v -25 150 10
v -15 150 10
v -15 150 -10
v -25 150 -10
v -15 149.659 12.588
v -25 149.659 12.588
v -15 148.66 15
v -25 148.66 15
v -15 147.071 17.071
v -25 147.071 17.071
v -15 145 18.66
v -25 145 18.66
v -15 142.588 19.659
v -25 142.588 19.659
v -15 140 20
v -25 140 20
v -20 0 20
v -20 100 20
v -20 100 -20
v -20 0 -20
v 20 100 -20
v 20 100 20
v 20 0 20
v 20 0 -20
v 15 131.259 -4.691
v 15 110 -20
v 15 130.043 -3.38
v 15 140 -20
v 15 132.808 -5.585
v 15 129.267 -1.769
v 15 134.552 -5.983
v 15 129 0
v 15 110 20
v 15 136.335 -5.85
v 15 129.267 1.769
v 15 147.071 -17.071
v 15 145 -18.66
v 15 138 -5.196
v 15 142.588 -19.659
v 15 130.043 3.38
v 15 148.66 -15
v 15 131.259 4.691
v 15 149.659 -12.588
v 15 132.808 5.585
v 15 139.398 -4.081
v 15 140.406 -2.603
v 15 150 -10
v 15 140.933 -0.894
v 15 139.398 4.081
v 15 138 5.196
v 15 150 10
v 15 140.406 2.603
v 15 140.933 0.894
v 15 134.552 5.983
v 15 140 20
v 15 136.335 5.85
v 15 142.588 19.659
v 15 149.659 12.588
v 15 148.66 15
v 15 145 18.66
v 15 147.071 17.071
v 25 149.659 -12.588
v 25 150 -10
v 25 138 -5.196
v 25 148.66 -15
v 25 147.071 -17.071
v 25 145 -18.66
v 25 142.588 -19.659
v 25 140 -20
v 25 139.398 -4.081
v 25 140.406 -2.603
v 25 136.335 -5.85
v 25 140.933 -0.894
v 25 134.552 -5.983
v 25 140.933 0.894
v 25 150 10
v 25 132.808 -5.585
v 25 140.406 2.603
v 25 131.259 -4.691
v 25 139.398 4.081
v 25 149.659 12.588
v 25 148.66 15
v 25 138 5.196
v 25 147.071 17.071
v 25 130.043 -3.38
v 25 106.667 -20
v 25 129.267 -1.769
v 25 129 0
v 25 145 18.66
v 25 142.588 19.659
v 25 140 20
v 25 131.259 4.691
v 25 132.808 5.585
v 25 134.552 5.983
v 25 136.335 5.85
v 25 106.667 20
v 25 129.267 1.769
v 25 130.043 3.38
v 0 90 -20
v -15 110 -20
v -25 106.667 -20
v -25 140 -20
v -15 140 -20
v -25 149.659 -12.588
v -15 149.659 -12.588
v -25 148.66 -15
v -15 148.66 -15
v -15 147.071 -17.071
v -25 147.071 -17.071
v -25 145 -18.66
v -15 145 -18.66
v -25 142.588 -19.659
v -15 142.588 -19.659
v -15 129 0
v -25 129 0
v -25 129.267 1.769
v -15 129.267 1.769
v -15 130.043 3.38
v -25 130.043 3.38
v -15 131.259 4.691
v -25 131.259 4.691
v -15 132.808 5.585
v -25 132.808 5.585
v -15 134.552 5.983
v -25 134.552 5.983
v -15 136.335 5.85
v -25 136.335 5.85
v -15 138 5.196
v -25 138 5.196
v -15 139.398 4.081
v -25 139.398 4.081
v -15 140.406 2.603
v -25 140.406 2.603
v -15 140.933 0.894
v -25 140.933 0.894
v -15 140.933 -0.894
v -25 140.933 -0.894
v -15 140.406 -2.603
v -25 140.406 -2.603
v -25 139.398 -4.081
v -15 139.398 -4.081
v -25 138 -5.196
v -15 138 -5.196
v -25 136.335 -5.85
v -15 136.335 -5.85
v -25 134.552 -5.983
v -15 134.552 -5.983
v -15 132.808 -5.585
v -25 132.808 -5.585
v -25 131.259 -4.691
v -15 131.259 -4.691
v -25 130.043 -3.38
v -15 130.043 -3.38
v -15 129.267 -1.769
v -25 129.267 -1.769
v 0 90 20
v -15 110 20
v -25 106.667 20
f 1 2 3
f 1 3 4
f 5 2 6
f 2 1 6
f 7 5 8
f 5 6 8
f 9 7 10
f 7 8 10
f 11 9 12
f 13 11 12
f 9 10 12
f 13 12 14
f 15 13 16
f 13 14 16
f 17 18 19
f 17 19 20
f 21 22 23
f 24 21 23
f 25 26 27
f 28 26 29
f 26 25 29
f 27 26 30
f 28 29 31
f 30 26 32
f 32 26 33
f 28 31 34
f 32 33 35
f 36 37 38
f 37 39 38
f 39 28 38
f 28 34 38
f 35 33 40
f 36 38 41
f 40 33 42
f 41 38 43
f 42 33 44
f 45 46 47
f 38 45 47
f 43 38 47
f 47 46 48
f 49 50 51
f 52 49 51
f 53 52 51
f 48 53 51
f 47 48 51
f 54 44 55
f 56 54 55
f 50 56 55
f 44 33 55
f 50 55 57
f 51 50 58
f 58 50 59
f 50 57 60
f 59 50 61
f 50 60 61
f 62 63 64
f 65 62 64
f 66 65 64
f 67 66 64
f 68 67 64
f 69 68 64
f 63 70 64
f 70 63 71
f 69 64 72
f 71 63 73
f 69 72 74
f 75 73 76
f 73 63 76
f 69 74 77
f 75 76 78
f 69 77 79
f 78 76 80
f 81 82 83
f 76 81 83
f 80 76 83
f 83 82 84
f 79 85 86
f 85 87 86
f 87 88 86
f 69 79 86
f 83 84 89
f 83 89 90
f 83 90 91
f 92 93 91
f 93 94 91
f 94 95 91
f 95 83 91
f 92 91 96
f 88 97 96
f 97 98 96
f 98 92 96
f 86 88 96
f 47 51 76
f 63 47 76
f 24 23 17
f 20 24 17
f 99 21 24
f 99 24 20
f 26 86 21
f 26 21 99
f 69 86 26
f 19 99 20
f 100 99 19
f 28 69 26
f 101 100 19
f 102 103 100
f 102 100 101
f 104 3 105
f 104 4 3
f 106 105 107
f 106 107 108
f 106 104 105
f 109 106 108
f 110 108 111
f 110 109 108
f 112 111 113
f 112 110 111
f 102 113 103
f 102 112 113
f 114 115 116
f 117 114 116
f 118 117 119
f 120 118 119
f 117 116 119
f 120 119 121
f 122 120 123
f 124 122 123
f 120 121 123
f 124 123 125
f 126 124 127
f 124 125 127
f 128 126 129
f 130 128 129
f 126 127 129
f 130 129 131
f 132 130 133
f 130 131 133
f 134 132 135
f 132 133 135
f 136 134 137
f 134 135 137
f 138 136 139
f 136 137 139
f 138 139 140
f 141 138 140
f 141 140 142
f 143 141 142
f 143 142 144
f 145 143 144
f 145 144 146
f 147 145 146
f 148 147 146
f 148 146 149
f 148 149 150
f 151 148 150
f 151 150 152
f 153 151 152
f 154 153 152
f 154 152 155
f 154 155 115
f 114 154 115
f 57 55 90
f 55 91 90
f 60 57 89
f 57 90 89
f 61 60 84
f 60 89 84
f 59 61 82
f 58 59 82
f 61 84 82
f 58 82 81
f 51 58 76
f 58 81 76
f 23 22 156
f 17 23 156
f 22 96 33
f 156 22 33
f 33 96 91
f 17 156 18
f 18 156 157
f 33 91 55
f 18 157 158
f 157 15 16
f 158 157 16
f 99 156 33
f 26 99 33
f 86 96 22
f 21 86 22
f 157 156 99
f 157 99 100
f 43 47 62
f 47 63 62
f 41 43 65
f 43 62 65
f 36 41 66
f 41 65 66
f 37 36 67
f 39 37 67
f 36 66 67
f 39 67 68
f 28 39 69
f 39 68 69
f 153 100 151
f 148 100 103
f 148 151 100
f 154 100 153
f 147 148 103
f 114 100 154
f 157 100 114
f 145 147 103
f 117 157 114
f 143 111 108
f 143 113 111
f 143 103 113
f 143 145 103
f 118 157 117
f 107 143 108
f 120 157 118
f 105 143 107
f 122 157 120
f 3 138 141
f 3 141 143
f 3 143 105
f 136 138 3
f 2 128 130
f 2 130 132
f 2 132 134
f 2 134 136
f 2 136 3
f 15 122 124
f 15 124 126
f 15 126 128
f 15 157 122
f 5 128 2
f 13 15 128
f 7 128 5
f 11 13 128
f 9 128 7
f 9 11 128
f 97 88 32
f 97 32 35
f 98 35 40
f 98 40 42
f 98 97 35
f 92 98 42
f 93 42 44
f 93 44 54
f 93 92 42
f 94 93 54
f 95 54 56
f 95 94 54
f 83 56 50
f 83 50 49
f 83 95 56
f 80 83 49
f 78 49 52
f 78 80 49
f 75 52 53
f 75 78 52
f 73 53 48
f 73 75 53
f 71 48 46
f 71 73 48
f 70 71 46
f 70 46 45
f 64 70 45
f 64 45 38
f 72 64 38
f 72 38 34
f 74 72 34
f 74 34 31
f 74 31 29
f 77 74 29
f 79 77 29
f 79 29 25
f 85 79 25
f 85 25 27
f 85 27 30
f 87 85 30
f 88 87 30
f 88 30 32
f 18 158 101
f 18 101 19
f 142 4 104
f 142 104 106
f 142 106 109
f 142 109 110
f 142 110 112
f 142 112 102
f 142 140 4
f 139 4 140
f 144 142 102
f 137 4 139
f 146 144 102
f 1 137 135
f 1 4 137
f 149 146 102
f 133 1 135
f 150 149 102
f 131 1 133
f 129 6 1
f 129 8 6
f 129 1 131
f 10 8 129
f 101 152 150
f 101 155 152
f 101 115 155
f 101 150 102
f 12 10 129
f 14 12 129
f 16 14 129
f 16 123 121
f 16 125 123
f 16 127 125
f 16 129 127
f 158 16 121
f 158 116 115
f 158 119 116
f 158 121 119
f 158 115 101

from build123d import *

# Parameters (mm, degrees)
ESTRUSIONE_ESTRUSIONE1_DEPTH = 20
SCHIZZO2_R                   = 6
TAGLIO_ESTRUSIONE1_DEPTH     = 40
RACCORDO1_R                  = 10


with BuildPart() as part:
    # Schizzo1 → Estrusione-Estrusione1 (new, symmetric)
    with BuildSketch(Plane.XY):
        Polygon((-25, 150), (-25, 106.666666667), (-20, 100), (-20, 0), (0, 0), (0, 90), (-15, 110), (-15, 150), align=None)
    extrude(amount=ESTRUSIONE_ESTRUSIONE1_DEPTH, both=True)

    # Schizzo2 → Taglio-Estrusione1 (cut)
    with BuildSketch(Plane.ZY.offset(25)):
        with Locations(Location((0, 135, 0), (0, 0, 270))):
            Circle(SCHIZZO2_R)
    extrude(amount=-TAGLIO_ESTRUSIONE1_DEPTH, mode=Mode.SUBTRACT)

    # Specchia1: part across plane


with BuildPart() as part_1:
    add(part.part)
    add(part.part.mirror(Plane(origin=(0, 0, 20), x_dir=(0, 0, 1), z_dir=(-1, 0, 0))))

    # Raccordo1
    raccordo1_edges = [part_1.edges().sort_by_distance(p)[0] for p in [
        (-20, 150, -20),
        (20, 150, 20),
        (20, 150, -20),
        (-20, 150, 20),
    ]]
    fillet(raccordo1_edges, radius=RACCORDO1_R)


solid = part_1.part
